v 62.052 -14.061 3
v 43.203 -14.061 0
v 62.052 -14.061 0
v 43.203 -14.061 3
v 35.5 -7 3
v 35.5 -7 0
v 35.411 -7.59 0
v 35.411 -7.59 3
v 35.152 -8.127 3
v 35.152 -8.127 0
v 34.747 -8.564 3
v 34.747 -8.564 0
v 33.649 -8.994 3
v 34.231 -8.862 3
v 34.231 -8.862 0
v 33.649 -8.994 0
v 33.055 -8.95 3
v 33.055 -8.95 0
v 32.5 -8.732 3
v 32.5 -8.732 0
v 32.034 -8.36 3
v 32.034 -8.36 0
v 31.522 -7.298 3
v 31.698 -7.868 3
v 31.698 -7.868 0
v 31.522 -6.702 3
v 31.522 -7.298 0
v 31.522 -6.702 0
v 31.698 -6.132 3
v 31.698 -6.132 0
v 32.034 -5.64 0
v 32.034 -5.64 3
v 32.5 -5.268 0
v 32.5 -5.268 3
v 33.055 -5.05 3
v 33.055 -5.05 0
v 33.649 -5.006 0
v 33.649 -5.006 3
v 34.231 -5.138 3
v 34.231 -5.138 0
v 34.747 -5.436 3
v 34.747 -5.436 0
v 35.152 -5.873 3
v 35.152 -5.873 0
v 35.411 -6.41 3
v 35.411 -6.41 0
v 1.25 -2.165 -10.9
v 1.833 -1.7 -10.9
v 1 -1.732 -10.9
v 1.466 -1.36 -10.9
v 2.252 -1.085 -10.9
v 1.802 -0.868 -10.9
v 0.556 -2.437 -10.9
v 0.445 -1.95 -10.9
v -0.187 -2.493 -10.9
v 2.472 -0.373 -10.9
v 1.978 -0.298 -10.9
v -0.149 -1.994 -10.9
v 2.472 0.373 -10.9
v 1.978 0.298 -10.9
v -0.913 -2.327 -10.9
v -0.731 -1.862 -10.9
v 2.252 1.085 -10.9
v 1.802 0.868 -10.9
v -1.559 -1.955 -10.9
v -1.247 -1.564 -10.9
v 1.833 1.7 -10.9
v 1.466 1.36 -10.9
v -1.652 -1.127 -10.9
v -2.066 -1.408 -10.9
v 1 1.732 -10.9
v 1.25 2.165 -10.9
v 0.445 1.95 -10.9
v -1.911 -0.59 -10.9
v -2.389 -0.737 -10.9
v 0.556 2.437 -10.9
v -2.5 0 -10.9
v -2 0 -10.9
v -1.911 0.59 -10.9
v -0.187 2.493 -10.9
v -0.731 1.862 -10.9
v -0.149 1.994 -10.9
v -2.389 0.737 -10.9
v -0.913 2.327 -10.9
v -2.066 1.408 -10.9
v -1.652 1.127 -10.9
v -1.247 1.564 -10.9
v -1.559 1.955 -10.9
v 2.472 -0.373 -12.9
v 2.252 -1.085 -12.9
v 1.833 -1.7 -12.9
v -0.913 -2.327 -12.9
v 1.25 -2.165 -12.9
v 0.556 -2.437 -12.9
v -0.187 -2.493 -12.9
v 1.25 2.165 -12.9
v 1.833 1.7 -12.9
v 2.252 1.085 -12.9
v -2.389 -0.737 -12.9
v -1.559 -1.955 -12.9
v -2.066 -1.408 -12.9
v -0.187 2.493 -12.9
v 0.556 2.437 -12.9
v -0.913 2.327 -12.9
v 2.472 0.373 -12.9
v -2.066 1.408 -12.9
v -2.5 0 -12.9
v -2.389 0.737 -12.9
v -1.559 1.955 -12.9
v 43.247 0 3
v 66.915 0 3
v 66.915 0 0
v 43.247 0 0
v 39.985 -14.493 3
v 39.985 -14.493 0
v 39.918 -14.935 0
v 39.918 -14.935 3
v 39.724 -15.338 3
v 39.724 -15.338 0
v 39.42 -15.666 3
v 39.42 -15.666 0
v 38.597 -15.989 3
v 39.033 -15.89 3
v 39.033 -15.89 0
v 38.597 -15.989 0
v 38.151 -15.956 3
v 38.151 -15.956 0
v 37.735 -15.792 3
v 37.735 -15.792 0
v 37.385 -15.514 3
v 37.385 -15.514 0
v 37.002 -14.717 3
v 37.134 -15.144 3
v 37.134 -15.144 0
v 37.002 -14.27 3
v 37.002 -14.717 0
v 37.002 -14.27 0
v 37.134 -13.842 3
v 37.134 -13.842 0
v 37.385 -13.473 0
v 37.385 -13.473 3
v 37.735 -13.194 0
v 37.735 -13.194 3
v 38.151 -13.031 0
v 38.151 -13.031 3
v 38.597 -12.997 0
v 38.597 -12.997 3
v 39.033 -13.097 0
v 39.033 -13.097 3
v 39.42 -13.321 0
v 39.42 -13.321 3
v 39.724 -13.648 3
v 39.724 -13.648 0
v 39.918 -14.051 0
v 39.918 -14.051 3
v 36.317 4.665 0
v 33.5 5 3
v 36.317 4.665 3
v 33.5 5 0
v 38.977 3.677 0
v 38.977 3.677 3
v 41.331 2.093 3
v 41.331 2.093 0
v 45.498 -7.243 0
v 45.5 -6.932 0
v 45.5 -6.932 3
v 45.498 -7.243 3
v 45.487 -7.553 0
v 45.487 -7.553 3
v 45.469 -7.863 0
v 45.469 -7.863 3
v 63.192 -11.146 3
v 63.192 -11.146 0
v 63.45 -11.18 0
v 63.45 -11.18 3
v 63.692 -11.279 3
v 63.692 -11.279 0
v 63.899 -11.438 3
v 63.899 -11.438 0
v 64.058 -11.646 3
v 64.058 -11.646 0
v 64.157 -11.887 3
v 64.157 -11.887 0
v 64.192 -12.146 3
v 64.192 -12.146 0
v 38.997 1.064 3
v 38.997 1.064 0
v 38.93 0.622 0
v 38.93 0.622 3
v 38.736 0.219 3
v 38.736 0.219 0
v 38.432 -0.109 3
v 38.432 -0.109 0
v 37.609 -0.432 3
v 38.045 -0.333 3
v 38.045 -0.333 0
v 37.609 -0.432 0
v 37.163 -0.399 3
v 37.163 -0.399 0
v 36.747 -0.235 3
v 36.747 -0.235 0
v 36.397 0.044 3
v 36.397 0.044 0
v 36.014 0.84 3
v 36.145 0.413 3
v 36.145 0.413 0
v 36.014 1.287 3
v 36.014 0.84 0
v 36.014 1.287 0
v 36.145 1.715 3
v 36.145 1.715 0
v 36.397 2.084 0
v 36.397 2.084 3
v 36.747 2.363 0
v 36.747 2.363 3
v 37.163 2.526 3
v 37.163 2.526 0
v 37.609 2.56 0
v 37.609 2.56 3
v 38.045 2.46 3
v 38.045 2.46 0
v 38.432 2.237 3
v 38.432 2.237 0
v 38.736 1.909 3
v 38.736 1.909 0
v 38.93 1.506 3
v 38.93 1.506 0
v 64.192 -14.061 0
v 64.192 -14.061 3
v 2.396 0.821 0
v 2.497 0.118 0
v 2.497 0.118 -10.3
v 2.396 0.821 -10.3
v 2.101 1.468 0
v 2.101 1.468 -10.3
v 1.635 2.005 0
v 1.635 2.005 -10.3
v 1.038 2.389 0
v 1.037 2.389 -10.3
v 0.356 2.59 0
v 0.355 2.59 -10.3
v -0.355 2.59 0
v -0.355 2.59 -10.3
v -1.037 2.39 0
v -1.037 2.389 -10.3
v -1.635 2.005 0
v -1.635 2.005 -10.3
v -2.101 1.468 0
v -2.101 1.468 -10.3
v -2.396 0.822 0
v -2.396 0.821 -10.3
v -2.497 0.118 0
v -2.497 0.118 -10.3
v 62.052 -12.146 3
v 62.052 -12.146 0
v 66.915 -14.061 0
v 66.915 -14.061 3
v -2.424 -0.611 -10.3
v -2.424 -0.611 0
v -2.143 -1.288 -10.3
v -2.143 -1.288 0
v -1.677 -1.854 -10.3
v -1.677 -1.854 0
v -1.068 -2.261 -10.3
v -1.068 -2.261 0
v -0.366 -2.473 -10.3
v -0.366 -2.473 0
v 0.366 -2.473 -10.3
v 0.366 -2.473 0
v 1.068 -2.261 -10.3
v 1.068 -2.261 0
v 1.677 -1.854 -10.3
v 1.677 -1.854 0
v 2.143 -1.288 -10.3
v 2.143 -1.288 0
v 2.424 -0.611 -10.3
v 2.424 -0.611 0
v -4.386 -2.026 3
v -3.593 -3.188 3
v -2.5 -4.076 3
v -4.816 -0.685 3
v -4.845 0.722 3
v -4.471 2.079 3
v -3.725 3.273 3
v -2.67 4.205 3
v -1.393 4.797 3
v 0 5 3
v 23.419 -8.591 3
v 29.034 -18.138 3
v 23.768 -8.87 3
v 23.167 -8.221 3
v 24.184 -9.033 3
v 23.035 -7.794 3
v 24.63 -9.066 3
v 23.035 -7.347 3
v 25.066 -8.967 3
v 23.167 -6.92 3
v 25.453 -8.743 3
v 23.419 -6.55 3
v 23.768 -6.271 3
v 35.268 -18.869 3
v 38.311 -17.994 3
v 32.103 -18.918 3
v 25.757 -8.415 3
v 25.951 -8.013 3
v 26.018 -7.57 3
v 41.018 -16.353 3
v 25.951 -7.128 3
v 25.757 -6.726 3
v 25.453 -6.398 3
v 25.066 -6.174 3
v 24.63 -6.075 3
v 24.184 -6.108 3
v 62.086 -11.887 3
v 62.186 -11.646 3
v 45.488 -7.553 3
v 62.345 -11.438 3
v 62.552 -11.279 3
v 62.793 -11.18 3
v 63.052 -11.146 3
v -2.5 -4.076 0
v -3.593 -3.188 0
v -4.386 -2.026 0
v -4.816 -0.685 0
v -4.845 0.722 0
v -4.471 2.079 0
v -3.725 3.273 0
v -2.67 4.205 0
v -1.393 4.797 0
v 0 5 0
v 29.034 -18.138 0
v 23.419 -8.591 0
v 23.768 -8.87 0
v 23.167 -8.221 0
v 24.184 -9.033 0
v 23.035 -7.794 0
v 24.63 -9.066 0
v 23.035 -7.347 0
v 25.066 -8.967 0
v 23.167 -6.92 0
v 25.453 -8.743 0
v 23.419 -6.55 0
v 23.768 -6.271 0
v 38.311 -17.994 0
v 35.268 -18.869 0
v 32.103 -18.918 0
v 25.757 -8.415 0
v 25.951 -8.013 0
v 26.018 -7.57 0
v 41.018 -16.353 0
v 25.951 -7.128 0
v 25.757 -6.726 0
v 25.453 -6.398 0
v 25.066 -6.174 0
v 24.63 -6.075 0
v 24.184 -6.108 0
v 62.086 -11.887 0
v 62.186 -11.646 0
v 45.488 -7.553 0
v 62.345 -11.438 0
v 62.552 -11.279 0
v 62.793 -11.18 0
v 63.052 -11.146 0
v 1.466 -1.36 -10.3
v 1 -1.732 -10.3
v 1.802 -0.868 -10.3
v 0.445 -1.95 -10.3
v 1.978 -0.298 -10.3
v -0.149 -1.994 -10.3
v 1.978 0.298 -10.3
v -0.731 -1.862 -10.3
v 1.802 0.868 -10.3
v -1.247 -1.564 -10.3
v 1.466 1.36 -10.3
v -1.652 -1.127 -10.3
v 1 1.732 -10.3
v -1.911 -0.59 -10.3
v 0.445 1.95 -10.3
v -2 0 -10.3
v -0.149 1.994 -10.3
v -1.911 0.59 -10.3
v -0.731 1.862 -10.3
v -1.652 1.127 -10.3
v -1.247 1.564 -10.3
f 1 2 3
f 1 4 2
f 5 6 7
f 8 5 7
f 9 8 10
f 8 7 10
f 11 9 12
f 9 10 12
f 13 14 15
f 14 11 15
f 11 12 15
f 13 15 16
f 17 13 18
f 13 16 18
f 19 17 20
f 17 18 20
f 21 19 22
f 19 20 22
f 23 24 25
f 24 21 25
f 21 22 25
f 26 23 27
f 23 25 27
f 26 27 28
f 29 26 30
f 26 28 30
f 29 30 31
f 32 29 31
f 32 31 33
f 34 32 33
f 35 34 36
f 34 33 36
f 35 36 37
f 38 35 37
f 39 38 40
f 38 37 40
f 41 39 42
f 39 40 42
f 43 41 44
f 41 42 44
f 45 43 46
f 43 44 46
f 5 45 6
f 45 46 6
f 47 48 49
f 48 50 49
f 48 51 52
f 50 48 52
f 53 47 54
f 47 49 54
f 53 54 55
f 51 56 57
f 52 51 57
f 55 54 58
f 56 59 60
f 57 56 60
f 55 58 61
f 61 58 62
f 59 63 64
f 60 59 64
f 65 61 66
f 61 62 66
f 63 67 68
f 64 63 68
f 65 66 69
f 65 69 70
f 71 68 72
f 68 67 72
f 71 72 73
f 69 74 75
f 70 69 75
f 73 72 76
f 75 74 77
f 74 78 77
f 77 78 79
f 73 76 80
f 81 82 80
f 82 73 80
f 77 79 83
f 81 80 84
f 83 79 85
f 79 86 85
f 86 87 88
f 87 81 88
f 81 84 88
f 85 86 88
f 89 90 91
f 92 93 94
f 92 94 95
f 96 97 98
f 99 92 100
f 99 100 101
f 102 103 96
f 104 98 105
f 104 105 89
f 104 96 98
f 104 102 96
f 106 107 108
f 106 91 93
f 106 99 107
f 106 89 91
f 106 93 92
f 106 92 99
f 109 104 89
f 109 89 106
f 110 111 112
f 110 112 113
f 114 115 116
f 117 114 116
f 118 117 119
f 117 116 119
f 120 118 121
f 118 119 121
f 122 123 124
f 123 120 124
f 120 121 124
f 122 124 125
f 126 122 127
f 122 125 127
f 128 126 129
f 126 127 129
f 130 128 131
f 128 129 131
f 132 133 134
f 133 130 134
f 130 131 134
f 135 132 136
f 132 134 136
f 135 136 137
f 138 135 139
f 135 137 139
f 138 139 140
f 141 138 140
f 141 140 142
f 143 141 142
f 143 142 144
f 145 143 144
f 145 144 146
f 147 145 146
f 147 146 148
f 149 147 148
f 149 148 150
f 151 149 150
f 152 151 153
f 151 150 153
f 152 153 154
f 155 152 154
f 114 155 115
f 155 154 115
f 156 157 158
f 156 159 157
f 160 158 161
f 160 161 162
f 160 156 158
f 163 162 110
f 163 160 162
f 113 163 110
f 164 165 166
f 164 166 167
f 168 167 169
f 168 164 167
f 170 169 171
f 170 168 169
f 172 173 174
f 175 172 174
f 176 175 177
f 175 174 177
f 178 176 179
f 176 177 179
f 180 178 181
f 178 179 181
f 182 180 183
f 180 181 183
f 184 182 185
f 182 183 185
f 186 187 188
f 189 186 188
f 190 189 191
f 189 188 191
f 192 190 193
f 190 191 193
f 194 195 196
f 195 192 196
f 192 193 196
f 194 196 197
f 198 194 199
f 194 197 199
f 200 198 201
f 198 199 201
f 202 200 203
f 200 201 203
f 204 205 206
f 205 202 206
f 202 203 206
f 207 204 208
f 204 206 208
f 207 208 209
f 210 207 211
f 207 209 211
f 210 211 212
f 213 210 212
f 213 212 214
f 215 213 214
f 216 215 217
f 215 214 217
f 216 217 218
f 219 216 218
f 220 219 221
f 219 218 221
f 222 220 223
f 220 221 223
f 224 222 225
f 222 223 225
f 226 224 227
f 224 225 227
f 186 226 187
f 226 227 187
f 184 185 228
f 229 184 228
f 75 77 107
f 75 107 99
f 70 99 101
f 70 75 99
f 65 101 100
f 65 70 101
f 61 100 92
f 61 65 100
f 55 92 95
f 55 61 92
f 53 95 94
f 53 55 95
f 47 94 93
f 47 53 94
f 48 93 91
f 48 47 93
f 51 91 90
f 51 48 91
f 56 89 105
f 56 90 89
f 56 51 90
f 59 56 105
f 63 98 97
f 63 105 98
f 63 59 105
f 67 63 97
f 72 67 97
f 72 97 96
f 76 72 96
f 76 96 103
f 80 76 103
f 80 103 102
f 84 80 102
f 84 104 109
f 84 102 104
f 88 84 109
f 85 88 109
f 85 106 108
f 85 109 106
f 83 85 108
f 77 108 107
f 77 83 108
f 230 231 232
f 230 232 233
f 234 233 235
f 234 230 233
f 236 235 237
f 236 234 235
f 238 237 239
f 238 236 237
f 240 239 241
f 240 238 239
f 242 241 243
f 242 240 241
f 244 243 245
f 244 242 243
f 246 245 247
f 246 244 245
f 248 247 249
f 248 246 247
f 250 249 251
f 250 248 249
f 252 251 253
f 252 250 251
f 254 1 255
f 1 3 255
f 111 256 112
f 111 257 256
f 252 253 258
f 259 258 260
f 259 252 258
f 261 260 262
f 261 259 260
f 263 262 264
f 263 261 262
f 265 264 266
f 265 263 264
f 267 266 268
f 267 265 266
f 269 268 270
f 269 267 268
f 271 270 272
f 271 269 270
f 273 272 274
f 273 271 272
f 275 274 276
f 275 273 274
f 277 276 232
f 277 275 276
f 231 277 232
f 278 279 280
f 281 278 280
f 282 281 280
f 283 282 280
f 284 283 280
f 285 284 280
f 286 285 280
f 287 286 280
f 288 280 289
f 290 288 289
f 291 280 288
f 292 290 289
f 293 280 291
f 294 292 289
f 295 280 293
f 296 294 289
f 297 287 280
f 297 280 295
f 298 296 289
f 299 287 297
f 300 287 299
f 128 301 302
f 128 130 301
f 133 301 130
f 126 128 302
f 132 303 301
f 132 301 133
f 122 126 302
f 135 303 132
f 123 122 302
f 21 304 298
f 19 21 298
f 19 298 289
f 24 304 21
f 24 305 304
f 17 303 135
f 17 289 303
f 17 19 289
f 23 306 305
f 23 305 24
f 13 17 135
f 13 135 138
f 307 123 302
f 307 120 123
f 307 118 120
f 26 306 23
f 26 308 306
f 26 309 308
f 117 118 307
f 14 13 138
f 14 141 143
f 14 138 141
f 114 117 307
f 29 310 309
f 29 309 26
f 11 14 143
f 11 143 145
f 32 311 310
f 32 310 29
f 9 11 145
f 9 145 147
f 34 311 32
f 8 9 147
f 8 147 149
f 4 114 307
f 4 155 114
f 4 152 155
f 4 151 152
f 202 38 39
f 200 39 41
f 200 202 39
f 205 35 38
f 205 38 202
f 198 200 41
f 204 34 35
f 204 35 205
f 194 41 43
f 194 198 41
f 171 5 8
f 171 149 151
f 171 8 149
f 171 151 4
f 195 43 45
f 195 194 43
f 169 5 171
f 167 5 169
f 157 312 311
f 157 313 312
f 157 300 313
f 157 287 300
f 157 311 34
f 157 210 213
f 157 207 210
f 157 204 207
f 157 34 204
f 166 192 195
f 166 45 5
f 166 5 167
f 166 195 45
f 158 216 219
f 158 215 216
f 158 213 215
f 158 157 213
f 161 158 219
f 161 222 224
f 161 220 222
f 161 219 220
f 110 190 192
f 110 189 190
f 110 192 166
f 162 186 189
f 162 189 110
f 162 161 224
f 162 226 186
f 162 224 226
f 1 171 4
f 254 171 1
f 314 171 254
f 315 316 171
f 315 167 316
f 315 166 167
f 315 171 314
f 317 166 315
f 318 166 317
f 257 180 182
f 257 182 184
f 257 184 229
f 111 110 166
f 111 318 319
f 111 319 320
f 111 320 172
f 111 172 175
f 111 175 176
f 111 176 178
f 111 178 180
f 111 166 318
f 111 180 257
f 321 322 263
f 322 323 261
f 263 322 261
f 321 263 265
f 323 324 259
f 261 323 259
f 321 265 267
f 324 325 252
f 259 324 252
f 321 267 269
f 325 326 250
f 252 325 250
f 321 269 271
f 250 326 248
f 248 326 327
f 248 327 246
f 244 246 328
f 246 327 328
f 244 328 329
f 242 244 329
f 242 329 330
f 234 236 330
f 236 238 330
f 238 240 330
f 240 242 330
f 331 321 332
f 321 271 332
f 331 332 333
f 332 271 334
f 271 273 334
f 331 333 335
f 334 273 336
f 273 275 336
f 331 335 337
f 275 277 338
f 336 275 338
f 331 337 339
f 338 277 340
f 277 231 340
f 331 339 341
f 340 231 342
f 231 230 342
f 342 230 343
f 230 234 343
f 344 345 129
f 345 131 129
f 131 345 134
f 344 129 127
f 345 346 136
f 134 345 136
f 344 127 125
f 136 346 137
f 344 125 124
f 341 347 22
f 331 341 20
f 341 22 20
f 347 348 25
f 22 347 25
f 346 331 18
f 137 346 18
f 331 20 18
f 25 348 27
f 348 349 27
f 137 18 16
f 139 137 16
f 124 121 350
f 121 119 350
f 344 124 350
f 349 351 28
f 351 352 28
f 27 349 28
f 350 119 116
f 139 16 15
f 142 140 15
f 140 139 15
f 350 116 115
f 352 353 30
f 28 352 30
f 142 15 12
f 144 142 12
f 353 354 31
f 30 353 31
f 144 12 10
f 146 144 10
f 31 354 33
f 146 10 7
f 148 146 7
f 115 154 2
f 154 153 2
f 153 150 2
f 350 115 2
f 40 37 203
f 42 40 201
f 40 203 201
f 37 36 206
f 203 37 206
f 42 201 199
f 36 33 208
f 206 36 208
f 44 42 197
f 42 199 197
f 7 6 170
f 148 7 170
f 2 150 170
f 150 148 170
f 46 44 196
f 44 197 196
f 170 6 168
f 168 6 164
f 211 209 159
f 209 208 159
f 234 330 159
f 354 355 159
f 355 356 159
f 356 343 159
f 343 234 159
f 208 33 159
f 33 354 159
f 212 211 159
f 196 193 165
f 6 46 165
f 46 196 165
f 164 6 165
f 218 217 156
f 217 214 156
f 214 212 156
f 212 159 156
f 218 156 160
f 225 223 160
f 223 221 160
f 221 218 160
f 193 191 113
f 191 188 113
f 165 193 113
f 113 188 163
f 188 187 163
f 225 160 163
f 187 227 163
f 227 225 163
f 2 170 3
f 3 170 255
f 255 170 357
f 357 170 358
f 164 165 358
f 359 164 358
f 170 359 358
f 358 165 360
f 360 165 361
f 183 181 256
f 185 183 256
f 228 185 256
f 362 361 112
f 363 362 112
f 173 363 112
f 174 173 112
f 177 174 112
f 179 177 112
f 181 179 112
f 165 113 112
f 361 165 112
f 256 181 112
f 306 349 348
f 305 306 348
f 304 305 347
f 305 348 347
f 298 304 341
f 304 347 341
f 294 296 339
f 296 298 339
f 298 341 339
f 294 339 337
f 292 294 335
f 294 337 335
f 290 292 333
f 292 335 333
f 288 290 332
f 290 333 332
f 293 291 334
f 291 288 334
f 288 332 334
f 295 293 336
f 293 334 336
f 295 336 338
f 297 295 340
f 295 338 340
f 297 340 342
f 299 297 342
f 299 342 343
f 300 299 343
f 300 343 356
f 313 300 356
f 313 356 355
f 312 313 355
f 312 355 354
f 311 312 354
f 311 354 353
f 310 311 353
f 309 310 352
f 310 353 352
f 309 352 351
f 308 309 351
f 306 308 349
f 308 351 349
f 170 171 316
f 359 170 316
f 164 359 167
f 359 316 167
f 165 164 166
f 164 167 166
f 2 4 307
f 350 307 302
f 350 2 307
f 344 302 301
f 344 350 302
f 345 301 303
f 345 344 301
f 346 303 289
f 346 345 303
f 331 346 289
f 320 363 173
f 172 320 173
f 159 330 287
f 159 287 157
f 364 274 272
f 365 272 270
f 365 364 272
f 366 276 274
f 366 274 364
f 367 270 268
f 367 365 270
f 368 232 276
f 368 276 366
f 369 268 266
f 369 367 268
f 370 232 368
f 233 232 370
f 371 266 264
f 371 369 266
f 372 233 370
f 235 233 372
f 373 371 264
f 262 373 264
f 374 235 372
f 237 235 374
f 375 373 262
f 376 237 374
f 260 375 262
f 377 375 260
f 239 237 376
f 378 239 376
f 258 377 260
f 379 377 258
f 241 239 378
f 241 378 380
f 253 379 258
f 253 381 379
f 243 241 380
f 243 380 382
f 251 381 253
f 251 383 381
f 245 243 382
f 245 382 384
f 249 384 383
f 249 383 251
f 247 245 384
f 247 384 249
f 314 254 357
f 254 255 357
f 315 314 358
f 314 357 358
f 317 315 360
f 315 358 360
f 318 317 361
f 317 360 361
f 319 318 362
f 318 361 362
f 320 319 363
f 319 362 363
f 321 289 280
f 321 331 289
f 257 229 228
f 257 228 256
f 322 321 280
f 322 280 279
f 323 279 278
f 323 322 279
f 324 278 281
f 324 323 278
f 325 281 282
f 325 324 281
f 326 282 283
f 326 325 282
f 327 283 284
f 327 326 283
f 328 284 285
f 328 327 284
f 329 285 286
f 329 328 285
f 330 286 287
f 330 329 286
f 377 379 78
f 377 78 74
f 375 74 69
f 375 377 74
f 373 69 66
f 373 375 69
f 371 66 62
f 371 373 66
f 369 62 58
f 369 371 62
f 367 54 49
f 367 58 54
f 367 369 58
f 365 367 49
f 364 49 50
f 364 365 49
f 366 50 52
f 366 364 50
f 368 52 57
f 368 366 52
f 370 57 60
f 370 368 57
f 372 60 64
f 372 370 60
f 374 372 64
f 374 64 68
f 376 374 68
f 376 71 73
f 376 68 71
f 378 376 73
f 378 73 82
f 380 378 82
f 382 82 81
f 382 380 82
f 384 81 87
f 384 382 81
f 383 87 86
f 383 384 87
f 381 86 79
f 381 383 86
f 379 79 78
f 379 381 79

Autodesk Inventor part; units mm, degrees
ref_plane "YZ Plane" through (0, 0, 0) normal (1, 0, 0) x (0, 1, 0)
ref_plane "XZ Plane" through (0, 0, 0) normal (0, 1, 0) x (-1, 0, 0)
ref_plane "XY Plane" through (0, 0, 0) normal (0, 0, 1) x (1, 0, 0)
sketch "Esquisse1" plane through (0, 0, 0) normal (0, 0, 1) x (1, 0, 0)
  circle A0 centre (0, 0) radius 2.5 projected
  circle A1 centre (33.5, -7) radius 12 projected
  circle A2 centre (33.5, -7) radius 2 projected
  circle A3 centre (38.485, -14.4933) radius 1.5 projected
  circle A4 centre (24.5181, -7.5705) radius 1.5 projected
  circle A5 centre (37.4969, 1.0638) radius 1.5 projected
  line L0 (0, 5) -> (33.5, 5)
  line L1 (29.0343, -18.1381) -> (-2.5, -4.0756)
  arc A6 (29.0343, -18.1381) -> (33.5, 5) centre (33.5, -7) ccw
  arc A7 (0, 5) -> (-2.5, -4.0756) centre (0, 0.1179) ccw
  circle A8 centre (0, 0.1179) radius 2.4972
  circle A9 centre (37.4969, 1.0638) radius 1.5
  circle A10 centre (24.5181, -7.5705) radius 1.5
  circle A11 centre (38.485, -14.4933) radius 1.5
extrude "Extrusion1" add sketch "Esquisse1" along normal blind 3 contours A1 L1 | A1 L1 A7 L0 picked at (27.6177, -3.3612)
sketch "Esquisse2" plane through (0, 0, 3) normal (0, 0, 1) x (1, 0, 0)
  point P0 (0, 0)
sketch "Esquisse3" plane through (0, 0, 3) normal (0, 0, 1) x (1, 0, 0)
  line L0 (42.9839, -14.0611) -> (66.9147, -14.0611)
  line L1 (66.9147, -14.0611) -> (66.9147, 0)
  line L2 (66.9147, 0) -> (42.9839, 0)
  circle A0 centre (33.5, -7) radius 2 projected
  circle A1 centre (37.4969, 1.0638) radius 1.5 projected
  circle A2 centre (24.5181, -7.5705) radius 1.5 projected
  circle A3 centre (38.485, -14.4933) radius 1.5 projected
  arc A4 (-2.4972, 0.1179) -> (2.4972, 0.1179) centre (0, 0) ccw projected
  arc A5 (2.4972, 0.1179) -> (-2.4972, 0.1179) centre (0, 0.1179) ccw projected
  arc A6 (0, 5) -> (-2.5, -4.0756) centre (0, 0.1179) ccw projected
  line L3 (-2.5, -4.0756) -> (29.0343, -18.1381) projected
  arc A7 (29.0343, -18.1381) -> (33.5, 5) centre (33.5, -7) ccw projected
  line L4 (33.5, 5) -> (0, 5) projected
  arc A8 (42.9839, -14.0611) -> (42.9839, 0) centre (34.4207, -7.0306) ccw
extrude "Extrusion2" add sketch "Esquisse3" against normal blind 3 contours A8 A7 L0 | A7 L2 L1 L0 | A8 L2 A7
sketch "Esquisse4" plane through (0, 0, 0) normal (0, 0, -1) x (-1, 0, 0)
  point P0 (0, 0)
sketch "Esquisse9" plane through (0, 0, 3) normal (0, 0, 1) x (1, 0, 0)
  arc A0 (-2.4972, 0.1179) -> (2.4972, 0.1179) centre (0, 0) ccw projected
  arc A1 (2.4972, 0.1179) -> (-2.4972, 0.1179) centre (0, 0.1179) ccw projected
extrude "Extrusion6" add sketch "Esquisse9" against normal blind 16
ref_plane "Plan de construction1" through (0, 0, -10.3) normal (0, 0, -1) x (-1, 0, 0)
sketch "Esquisse13" plane through (0, 0, -13) normal (0, 0, -1) x (-1, 0, 0)
  circle A0 centre (0, 0) radius 2.932
extrude "Extrusion8" cut sketch "Esquisse13" against normal up to surface (2.7 mm away)
sketch "Esquisse14" plane through (0, 0, -10.3) normal (0, 0, -1) x (-1, 0, 0)
  circle A0 centre (0, 0) radius 2
  dimension "d20" = 4
extrude "Extrusion9" add sketch "Esquisse14" along normal blind 0.6
sketch "Esquisse15" plane through (0, 0, -10.9) normal (0, 0, -1) x (-1, 0, 0)
  circle A0 centre (0, 0) radius 2.5
extrude "Extrusion10" add sketch "Esquisse15" along normal blind 2
sketch "Esquisse16" plane through (0, 0, 0) normal (0, 0, -1) x (-1, 0, 0)
  line L0 (-66.9147, -14.0611) -> (-43.2026, -14.0611) projected
  line L1 (-64.1915, -14.0611) -> (-62.052, -14.0611)
  line L2 (-62.052, -14.0611) -> (-62.052, -12.1455)
  line L3 (-63.052, -11.1455) -> (-63.1915, -11.1455)
  line L4 (-64.1915, -12.1455) -> (-64.1915, -14.0611)
  arc A0 (-62.052, -12.1455) -> (-63.052, -11.1455) centre (-63.052, -12.1455) ccw
  arc A1 (-63.1915, -11.1455) -> (-64.1915, -12.1455) centre (-63.1915, -12.1455) ccw
  point P0 (0, 0)
  dimension "d25" = 1
extrude "Extrusion11" cut sketch "Esquisse16" against normal blind 10
properties part number "bras-Codeur"
